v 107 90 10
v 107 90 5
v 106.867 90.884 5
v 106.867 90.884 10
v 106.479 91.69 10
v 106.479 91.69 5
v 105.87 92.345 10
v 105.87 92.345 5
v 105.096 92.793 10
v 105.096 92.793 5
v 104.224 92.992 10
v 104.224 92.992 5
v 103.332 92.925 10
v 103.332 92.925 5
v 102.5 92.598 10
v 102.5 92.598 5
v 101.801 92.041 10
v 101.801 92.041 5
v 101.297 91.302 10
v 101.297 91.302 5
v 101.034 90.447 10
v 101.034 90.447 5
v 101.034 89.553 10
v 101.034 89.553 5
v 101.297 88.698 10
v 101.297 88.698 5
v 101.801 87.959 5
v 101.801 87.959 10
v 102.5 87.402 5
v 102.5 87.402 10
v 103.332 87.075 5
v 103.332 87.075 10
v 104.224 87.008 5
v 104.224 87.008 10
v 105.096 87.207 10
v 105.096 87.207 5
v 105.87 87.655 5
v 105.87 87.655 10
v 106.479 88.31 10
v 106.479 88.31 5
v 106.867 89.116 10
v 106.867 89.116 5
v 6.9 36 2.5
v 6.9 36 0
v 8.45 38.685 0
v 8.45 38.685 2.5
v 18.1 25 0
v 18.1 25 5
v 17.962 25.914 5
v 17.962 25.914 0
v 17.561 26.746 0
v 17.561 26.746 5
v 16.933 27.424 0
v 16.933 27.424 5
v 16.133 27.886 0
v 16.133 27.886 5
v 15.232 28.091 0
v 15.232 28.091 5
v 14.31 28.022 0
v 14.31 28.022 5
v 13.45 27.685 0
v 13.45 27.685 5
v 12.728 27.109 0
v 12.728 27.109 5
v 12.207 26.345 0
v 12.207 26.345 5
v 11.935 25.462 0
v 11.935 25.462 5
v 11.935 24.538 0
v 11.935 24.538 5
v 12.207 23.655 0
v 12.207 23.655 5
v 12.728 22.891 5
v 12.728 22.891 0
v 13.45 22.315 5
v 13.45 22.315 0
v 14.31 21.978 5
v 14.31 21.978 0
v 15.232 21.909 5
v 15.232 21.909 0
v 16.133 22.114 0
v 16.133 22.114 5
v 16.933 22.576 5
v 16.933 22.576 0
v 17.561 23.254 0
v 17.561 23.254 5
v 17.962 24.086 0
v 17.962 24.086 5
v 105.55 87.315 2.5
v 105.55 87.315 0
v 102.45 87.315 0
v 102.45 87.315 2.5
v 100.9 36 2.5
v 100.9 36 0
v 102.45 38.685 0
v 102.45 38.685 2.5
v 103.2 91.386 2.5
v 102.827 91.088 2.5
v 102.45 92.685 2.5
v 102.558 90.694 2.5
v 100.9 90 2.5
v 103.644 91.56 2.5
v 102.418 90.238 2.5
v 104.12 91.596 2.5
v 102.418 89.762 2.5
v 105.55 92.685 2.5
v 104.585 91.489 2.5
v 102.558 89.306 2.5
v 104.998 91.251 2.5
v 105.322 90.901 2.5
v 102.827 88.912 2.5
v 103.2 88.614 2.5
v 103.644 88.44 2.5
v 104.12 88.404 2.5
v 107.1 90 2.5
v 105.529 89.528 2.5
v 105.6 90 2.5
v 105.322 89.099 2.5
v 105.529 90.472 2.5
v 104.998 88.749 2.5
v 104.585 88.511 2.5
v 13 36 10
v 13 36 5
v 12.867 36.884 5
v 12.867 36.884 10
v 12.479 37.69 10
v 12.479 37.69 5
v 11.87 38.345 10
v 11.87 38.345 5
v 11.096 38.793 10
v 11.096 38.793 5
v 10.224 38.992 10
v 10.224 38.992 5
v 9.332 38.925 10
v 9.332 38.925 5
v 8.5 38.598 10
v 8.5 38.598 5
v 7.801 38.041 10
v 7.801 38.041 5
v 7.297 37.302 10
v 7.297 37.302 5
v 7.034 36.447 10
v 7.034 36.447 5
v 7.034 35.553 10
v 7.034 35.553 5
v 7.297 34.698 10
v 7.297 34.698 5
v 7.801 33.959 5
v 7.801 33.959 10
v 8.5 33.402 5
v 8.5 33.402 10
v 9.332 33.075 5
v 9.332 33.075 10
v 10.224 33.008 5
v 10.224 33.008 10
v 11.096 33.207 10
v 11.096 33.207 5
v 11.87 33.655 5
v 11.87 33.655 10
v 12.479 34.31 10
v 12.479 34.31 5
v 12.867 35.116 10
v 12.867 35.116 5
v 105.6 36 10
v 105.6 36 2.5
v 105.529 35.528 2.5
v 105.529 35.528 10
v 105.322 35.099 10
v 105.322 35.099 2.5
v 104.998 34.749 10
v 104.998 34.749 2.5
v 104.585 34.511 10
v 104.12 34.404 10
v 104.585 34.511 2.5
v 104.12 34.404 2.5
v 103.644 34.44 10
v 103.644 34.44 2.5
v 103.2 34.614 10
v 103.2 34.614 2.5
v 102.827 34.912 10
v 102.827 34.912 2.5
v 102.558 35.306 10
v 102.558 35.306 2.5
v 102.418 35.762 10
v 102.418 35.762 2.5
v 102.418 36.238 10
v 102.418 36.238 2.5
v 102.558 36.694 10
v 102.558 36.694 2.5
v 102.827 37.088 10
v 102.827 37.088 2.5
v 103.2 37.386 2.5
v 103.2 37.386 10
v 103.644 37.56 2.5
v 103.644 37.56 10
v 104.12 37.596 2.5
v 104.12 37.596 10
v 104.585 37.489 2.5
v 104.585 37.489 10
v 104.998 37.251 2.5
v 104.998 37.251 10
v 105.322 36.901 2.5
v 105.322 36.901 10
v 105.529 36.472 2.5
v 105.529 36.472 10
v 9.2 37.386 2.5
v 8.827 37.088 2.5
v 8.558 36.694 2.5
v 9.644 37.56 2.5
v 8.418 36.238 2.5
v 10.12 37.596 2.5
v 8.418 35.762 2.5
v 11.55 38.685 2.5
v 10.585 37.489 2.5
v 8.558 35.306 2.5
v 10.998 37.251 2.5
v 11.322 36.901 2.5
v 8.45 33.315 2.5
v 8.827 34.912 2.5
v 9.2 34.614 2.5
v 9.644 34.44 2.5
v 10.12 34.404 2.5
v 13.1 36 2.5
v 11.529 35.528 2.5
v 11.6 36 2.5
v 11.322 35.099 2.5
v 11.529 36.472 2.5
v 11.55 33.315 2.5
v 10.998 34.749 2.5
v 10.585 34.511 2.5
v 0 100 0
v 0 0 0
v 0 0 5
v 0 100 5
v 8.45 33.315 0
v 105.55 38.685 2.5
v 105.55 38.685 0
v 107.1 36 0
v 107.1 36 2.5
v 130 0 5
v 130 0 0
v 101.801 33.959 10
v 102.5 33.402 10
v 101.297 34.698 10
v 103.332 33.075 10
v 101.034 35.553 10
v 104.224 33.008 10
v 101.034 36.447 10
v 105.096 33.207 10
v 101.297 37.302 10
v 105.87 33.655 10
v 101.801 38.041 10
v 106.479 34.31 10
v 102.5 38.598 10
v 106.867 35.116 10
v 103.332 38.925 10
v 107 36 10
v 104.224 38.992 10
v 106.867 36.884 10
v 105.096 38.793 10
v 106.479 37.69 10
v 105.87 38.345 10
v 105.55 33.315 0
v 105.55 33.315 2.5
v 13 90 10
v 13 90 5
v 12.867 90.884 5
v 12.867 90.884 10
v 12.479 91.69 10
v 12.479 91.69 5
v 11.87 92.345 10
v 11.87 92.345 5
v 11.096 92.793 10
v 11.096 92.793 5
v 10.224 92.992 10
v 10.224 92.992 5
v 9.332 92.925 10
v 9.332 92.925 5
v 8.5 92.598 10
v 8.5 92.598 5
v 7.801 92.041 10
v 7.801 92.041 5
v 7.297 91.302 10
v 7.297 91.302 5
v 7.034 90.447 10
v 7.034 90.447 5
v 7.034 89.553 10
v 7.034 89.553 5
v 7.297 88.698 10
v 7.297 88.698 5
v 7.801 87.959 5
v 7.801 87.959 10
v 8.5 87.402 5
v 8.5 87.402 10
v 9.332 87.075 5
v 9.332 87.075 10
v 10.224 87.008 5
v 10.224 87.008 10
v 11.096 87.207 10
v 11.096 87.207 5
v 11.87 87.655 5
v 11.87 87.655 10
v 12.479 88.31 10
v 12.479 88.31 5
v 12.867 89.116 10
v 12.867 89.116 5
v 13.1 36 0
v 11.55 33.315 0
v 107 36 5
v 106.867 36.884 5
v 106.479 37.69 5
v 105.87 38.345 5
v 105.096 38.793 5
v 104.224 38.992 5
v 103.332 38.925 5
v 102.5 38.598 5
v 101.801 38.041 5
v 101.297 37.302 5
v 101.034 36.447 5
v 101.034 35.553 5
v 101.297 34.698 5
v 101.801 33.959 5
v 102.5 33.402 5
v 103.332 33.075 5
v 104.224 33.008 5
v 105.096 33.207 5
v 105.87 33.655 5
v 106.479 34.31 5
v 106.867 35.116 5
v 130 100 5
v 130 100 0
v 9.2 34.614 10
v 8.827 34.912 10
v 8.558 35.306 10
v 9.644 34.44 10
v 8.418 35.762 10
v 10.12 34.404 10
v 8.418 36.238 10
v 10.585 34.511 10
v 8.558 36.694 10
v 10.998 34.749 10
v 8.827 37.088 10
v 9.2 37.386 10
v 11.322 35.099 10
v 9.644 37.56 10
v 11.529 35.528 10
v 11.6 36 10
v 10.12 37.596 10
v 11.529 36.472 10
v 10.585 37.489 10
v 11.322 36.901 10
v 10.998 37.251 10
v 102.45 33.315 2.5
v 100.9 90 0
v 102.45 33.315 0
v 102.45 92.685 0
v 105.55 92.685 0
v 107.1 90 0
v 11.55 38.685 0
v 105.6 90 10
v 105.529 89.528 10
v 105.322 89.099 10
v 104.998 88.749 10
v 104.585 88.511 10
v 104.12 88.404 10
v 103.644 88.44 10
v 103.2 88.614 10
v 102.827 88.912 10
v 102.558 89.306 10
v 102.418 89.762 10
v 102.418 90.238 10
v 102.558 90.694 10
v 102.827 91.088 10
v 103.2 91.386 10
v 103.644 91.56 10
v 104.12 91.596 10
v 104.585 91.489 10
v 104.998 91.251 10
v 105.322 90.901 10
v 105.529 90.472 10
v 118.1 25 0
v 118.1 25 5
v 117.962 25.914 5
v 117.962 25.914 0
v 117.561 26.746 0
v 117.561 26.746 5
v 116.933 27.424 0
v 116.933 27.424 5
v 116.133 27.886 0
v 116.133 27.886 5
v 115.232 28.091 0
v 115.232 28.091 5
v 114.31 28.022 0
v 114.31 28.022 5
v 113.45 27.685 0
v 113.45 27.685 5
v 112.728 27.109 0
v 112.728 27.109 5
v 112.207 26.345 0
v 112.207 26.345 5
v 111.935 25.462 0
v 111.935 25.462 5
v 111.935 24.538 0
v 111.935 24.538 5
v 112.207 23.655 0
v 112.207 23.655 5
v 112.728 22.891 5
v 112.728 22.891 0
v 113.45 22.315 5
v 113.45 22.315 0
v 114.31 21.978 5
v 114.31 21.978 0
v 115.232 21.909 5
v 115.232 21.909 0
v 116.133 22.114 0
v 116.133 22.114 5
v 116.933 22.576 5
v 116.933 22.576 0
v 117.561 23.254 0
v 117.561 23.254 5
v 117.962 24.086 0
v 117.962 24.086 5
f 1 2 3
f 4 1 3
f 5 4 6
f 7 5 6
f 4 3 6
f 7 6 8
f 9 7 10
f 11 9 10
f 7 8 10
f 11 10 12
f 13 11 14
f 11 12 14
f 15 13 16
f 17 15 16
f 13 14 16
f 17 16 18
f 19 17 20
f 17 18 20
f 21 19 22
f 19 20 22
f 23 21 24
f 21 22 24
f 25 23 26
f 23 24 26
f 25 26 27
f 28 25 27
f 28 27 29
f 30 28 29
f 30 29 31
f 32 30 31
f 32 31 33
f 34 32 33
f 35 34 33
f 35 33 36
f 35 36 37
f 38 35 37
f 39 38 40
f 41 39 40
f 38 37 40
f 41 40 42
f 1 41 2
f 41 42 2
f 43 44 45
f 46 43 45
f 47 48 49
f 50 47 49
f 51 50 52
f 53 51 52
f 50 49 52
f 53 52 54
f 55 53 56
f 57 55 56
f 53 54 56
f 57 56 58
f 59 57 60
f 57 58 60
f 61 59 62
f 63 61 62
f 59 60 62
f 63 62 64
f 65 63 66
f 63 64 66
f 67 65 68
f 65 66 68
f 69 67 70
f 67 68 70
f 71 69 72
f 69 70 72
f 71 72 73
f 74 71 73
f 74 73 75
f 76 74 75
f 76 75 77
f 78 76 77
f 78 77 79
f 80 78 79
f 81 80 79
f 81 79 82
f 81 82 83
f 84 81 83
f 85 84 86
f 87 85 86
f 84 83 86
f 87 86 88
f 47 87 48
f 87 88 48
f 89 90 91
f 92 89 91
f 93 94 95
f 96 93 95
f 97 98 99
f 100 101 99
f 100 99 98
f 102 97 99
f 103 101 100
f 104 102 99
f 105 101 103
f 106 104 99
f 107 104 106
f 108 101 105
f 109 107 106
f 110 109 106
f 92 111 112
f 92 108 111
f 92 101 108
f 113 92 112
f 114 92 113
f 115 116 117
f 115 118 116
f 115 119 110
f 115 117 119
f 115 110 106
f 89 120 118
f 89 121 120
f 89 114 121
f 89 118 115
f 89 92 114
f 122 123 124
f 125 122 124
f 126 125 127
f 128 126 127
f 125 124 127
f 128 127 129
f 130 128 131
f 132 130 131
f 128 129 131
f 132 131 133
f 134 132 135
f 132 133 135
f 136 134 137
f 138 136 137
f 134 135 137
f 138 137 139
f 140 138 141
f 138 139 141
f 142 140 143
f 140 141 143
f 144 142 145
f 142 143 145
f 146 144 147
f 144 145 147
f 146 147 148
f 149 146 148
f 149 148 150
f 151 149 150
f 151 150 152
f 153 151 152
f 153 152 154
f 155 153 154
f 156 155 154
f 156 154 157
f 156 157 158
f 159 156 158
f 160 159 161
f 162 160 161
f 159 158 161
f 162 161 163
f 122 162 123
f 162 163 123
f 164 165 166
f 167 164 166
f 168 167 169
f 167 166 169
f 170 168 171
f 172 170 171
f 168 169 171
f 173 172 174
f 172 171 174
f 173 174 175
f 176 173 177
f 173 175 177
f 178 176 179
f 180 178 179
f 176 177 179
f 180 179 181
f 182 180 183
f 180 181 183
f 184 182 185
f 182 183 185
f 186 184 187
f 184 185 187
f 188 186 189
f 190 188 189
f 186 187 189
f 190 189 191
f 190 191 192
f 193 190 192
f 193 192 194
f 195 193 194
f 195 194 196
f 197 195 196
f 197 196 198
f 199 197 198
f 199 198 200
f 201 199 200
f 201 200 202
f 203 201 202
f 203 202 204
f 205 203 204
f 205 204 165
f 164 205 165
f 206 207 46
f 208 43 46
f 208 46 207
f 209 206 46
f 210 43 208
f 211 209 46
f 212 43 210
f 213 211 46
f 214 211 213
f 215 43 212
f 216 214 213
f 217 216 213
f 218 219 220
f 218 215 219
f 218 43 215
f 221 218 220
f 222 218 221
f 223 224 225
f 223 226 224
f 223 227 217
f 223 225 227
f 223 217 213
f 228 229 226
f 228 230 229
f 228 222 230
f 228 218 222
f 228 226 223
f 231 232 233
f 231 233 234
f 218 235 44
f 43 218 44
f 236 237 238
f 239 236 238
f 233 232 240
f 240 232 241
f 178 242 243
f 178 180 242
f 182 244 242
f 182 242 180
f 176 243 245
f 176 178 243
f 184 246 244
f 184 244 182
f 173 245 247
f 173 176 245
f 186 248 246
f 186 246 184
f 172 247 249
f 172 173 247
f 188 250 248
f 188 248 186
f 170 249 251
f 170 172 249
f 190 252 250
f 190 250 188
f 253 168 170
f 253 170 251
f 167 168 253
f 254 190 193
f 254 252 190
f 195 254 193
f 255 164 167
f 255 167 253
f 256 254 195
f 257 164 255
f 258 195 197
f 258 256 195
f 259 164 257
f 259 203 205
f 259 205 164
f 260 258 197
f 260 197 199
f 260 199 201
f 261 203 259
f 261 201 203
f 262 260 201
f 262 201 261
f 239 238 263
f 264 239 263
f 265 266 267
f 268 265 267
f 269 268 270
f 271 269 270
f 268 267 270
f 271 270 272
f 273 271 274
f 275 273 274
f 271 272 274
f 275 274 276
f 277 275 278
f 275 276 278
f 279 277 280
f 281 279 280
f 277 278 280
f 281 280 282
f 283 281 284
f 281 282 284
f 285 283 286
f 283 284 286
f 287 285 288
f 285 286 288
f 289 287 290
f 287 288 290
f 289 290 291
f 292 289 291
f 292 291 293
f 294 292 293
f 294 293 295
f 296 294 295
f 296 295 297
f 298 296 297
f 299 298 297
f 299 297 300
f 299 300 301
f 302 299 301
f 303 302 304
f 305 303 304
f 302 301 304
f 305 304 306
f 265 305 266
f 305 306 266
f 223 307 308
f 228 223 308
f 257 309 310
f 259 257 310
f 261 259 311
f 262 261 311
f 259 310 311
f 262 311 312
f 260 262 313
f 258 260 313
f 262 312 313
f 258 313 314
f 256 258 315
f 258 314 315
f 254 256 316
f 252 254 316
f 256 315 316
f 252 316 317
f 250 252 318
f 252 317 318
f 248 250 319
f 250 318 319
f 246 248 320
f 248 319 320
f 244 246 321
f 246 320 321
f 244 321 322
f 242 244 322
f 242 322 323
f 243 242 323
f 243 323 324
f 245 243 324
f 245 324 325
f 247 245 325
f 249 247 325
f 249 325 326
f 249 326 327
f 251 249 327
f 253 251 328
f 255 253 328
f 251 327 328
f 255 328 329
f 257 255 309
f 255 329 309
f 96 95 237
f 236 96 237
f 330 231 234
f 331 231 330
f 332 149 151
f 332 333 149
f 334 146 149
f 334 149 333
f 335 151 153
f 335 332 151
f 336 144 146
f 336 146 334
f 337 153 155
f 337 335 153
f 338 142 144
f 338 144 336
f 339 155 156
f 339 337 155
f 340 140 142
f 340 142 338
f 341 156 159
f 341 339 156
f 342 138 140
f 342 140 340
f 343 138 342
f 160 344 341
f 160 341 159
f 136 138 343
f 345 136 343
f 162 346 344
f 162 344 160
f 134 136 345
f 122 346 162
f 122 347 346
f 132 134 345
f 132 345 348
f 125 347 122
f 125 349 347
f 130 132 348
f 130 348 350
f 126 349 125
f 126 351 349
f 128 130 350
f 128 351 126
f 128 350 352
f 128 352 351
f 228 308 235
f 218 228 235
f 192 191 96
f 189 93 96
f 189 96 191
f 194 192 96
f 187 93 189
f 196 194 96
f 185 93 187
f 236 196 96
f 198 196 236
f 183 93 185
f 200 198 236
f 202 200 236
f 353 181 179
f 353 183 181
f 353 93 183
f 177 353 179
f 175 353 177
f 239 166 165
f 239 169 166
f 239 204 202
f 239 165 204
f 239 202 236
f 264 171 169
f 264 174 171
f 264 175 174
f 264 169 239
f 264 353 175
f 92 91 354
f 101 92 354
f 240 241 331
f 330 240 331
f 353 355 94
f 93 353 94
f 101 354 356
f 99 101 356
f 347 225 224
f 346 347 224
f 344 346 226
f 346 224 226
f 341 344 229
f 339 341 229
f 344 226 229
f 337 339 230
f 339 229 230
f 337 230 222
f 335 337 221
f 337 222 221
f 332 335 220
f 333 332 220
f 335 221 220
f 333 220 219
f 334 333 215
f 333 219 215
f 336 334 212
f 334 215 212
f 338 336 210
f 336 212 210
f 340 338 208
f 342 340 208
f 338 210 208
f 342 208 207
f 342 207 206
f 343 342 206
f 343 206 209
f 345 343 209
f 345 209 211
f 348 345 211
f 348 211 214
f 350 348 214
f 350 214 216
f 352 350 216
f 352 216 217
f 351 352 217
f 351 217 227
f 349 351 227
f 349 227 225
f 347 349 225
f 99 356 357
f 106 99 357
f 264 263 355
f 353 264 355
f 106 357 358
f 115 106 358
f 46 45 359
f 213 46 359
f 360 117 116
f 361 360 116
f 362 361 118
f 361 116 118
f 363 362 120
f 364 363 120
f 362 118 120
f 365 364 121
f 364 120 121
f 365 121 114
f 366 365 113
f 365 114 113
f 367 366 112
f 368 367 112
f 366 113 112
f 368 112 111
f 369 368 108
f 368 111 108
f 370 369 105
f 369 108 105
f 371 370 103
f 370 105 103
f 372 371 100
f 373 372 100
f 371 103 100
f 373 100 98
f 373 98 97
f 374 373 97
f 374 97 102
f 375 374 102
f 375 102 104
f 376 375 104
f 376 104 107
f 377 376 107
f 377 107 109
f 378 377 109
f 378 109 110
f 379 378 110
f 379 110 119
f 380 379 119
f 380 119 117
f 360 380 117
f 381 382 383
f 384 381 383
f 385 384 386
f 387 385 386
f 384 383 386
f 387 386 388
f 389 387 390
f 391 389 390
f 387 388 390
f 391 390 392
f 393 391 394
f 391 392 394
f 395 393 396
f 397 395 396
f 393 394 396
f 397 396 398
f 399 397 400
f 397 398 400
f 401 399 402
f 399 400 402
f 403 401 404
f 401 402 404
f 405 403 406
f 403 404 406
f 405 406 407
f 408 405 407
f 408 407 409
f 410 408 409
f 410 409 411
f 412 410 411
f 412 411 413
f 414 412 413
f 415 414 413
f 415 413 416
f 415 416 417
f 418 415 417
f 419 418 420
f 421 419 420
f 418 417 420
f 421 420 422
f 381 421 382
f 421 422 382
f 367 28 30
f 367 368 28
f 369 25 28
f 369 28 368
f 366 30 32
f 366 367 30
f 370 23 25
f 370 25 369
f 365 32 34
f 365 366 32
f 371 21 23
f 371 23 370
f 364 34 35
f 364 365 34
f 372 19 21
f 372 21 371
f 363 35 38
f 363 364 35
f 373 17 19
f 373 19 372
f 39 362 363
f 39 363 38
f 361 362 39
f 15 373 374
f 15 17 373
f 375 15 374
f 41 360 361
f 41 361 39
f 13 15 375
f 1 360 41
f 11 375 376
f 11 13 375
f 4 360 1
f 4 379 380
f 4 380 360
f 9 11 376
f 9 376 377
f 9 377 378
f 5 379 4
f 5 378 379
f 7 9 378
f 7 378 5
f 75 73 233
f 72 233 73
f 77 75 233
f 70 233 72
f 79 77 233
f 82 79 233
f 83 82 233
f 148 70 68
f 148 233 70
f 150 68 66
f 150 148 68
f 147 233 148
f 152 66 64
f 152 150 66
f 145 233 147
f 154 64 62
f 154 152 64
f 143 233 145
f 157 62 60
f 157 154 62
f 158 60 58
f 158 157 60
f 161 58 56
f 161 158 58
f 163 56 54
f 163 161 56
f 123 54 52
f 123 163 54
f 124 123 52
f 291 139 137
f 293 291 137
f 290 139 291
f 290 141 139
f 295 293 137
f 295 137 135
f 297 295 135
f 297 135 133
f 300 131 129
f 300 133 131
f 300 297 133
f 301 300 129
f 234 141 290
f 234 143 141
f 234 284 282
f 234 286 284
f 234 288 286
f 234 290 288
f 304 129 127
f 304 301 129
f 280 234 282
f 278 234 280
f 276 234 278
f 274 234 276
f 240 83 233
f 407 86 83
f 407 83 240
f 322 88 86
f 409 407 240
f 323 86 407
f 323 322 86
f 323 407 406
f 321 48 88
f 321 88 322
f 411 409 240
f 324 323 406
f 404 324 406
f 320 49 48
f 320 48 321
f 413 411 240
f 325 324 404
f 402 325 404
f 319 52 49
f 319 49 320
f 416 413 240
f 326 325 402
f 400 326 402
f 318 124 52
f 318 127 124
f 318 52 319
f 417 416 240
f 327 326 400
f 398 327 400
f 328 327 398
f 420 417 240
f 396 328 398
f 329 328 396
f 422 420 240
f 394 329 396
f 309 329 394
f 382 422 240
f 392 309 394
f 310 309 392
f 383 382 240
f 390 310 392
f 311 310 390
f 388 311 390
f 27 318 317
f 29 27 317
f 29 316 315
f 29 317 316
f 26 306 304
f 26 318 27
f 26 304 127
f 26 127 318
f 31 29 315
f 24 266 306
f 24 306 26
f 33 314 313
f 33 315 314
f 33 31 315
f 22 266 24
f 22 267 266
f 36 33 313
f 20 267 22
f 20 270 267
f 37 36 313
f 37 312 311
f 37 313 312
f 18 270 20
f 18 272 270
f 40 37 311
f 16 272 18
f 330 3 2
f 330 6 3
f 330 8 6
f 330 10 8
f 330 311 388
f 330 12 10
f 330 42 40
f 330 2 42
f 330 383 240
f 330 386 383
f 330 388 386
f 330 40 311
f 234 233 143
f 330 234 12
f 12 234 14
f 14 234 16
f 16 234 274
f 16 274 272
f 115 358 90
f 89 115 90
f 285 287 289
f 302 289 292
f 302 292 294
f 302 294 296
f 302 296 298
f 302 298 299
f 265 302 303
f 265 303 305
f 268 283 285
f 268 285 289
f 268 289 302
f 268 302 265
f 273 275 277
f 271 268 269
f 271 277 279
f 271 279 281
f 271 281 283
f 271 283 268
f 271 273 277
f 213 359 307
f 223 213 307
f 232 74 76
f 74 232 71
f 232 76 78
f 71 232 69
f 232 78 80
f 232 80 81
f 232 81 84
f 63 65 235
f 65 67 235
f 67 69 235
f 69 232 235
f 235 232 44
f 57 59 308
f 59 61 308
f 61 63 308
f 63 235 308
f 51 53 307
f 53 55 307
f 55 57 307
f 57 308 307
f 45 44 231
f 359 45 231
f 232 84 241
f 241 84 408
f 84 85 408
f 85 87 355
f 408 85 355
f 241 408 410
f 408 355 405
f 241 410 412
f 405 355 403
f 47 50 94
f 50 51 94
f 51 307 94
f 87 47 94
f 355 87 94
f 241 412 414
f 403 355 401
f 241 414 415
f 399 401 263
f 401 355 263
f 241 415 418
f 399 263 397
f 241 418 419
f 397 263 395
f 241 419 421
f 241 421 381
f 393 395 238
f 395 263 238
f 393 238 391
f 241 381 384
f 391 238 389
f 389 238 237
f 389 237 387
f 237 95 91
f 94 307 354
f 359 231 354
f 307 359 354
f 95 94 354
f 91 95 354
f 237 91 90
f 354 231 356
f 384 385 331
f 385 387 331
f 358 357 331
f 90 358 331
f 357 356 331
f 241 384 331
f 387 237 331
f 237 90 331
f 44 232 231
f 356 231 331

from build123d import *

# Parameters (mm, degrees)
SKETCH001_W     = 130
SKETCH001_H     = 100
PAD001_DEPTH    = 5
SKETCH002_R     = 3
PAD002_DEPTH    = 5
SKETCH003_R     = 1.6
POCKET_DEPTH    = 10
POCKET005_DEPTH = 2.5
SKETCH013_R     = 3.1
POCKET006_DEPTH = 5


with BuildPart() as part:
    # Sketch001 → Pad001 (new body)
    with BuildSketch(Plane.XY):
        with Locations((65, 50)):
            Rectangle(SKETCH001_W, SKETCH001_H)
    extrude(amount=PAD001_DEPTH)

    # Sketch002 (on Face6 of Pad001) → Pad002 (join)
    with BuildSketch(Plane.XY.offset(5)):
        with Locations((10, 90)):
            Circle(SKETCH002_R)
        with Locations((10, 36)):
            Circle(SKETCH002_R)
        with Locations((104, 90)):
            Circle(SKETCH002_R)
        with Locations((104, 36)):
            Circle(SKETCH002_R)
    extrude(amount=PAD002_DEPTH)

    # Sketch003 (on Face4 of Pad002) → Pocket (cut)
    with BuildSketch(Plane(origin=(0, 0, 0), x_dir=(1, 0, 0), z_dir=(0, 0, -1))):
        with Locations((10, -36)):
            Circle(SKETCH003_R)
        with Locations((104, -36)):
            Circle(SKETCH003_R)
        with Locations((104, -90)):
            Circle(SKETCH003_R)
    extrude(amount=-POCKET_DEPTH, mode=Mode.SUBTRACT)

    # Sketch012 (on Face4 of Pocket) → Pocket005 (cut)
    with BuildSketch(Plane(origin=(0, 0, 0), x_dir=(1, 0, 0), z_dir=(0, 0, -1))):
        Polygon((107.1, -90), (105.55, -87.315321), (102.45, -87.315321), (100.9, -90), (102.45, -92.684679), (105.55, -92.684679), align=None)
        Polygon((13.1, -36), (11.55, -33.315321), (8.45, -33.315321), (6.9, -36), (8.45, -38.684679), (11.55, -38.684679), align=None)
        Polygon((107.1, -36), (105.55, -33.315321), (102.45, -33.315321), (100.9, -36), (102.45, -38.684679), (105.55, -38.684679), align=None)
    extrude(amount=-POCKET005_DEPTH, mode=Mode.SUBTRACT)

    # Sketch013 (on Face6 of Pad001) → Pocket006 (cut)
    with BuildSketch(Plane.XY.offset(5)):
        with Locations((115, 25)):
            Circle(SKETCH013_R)
        with Locations((15, 25)):
            Circle(SKETCH013_R)
    extrude(amount=-POCKET006_DEPTH, mode=Mode.SUBTRACT)


solid = part.part
